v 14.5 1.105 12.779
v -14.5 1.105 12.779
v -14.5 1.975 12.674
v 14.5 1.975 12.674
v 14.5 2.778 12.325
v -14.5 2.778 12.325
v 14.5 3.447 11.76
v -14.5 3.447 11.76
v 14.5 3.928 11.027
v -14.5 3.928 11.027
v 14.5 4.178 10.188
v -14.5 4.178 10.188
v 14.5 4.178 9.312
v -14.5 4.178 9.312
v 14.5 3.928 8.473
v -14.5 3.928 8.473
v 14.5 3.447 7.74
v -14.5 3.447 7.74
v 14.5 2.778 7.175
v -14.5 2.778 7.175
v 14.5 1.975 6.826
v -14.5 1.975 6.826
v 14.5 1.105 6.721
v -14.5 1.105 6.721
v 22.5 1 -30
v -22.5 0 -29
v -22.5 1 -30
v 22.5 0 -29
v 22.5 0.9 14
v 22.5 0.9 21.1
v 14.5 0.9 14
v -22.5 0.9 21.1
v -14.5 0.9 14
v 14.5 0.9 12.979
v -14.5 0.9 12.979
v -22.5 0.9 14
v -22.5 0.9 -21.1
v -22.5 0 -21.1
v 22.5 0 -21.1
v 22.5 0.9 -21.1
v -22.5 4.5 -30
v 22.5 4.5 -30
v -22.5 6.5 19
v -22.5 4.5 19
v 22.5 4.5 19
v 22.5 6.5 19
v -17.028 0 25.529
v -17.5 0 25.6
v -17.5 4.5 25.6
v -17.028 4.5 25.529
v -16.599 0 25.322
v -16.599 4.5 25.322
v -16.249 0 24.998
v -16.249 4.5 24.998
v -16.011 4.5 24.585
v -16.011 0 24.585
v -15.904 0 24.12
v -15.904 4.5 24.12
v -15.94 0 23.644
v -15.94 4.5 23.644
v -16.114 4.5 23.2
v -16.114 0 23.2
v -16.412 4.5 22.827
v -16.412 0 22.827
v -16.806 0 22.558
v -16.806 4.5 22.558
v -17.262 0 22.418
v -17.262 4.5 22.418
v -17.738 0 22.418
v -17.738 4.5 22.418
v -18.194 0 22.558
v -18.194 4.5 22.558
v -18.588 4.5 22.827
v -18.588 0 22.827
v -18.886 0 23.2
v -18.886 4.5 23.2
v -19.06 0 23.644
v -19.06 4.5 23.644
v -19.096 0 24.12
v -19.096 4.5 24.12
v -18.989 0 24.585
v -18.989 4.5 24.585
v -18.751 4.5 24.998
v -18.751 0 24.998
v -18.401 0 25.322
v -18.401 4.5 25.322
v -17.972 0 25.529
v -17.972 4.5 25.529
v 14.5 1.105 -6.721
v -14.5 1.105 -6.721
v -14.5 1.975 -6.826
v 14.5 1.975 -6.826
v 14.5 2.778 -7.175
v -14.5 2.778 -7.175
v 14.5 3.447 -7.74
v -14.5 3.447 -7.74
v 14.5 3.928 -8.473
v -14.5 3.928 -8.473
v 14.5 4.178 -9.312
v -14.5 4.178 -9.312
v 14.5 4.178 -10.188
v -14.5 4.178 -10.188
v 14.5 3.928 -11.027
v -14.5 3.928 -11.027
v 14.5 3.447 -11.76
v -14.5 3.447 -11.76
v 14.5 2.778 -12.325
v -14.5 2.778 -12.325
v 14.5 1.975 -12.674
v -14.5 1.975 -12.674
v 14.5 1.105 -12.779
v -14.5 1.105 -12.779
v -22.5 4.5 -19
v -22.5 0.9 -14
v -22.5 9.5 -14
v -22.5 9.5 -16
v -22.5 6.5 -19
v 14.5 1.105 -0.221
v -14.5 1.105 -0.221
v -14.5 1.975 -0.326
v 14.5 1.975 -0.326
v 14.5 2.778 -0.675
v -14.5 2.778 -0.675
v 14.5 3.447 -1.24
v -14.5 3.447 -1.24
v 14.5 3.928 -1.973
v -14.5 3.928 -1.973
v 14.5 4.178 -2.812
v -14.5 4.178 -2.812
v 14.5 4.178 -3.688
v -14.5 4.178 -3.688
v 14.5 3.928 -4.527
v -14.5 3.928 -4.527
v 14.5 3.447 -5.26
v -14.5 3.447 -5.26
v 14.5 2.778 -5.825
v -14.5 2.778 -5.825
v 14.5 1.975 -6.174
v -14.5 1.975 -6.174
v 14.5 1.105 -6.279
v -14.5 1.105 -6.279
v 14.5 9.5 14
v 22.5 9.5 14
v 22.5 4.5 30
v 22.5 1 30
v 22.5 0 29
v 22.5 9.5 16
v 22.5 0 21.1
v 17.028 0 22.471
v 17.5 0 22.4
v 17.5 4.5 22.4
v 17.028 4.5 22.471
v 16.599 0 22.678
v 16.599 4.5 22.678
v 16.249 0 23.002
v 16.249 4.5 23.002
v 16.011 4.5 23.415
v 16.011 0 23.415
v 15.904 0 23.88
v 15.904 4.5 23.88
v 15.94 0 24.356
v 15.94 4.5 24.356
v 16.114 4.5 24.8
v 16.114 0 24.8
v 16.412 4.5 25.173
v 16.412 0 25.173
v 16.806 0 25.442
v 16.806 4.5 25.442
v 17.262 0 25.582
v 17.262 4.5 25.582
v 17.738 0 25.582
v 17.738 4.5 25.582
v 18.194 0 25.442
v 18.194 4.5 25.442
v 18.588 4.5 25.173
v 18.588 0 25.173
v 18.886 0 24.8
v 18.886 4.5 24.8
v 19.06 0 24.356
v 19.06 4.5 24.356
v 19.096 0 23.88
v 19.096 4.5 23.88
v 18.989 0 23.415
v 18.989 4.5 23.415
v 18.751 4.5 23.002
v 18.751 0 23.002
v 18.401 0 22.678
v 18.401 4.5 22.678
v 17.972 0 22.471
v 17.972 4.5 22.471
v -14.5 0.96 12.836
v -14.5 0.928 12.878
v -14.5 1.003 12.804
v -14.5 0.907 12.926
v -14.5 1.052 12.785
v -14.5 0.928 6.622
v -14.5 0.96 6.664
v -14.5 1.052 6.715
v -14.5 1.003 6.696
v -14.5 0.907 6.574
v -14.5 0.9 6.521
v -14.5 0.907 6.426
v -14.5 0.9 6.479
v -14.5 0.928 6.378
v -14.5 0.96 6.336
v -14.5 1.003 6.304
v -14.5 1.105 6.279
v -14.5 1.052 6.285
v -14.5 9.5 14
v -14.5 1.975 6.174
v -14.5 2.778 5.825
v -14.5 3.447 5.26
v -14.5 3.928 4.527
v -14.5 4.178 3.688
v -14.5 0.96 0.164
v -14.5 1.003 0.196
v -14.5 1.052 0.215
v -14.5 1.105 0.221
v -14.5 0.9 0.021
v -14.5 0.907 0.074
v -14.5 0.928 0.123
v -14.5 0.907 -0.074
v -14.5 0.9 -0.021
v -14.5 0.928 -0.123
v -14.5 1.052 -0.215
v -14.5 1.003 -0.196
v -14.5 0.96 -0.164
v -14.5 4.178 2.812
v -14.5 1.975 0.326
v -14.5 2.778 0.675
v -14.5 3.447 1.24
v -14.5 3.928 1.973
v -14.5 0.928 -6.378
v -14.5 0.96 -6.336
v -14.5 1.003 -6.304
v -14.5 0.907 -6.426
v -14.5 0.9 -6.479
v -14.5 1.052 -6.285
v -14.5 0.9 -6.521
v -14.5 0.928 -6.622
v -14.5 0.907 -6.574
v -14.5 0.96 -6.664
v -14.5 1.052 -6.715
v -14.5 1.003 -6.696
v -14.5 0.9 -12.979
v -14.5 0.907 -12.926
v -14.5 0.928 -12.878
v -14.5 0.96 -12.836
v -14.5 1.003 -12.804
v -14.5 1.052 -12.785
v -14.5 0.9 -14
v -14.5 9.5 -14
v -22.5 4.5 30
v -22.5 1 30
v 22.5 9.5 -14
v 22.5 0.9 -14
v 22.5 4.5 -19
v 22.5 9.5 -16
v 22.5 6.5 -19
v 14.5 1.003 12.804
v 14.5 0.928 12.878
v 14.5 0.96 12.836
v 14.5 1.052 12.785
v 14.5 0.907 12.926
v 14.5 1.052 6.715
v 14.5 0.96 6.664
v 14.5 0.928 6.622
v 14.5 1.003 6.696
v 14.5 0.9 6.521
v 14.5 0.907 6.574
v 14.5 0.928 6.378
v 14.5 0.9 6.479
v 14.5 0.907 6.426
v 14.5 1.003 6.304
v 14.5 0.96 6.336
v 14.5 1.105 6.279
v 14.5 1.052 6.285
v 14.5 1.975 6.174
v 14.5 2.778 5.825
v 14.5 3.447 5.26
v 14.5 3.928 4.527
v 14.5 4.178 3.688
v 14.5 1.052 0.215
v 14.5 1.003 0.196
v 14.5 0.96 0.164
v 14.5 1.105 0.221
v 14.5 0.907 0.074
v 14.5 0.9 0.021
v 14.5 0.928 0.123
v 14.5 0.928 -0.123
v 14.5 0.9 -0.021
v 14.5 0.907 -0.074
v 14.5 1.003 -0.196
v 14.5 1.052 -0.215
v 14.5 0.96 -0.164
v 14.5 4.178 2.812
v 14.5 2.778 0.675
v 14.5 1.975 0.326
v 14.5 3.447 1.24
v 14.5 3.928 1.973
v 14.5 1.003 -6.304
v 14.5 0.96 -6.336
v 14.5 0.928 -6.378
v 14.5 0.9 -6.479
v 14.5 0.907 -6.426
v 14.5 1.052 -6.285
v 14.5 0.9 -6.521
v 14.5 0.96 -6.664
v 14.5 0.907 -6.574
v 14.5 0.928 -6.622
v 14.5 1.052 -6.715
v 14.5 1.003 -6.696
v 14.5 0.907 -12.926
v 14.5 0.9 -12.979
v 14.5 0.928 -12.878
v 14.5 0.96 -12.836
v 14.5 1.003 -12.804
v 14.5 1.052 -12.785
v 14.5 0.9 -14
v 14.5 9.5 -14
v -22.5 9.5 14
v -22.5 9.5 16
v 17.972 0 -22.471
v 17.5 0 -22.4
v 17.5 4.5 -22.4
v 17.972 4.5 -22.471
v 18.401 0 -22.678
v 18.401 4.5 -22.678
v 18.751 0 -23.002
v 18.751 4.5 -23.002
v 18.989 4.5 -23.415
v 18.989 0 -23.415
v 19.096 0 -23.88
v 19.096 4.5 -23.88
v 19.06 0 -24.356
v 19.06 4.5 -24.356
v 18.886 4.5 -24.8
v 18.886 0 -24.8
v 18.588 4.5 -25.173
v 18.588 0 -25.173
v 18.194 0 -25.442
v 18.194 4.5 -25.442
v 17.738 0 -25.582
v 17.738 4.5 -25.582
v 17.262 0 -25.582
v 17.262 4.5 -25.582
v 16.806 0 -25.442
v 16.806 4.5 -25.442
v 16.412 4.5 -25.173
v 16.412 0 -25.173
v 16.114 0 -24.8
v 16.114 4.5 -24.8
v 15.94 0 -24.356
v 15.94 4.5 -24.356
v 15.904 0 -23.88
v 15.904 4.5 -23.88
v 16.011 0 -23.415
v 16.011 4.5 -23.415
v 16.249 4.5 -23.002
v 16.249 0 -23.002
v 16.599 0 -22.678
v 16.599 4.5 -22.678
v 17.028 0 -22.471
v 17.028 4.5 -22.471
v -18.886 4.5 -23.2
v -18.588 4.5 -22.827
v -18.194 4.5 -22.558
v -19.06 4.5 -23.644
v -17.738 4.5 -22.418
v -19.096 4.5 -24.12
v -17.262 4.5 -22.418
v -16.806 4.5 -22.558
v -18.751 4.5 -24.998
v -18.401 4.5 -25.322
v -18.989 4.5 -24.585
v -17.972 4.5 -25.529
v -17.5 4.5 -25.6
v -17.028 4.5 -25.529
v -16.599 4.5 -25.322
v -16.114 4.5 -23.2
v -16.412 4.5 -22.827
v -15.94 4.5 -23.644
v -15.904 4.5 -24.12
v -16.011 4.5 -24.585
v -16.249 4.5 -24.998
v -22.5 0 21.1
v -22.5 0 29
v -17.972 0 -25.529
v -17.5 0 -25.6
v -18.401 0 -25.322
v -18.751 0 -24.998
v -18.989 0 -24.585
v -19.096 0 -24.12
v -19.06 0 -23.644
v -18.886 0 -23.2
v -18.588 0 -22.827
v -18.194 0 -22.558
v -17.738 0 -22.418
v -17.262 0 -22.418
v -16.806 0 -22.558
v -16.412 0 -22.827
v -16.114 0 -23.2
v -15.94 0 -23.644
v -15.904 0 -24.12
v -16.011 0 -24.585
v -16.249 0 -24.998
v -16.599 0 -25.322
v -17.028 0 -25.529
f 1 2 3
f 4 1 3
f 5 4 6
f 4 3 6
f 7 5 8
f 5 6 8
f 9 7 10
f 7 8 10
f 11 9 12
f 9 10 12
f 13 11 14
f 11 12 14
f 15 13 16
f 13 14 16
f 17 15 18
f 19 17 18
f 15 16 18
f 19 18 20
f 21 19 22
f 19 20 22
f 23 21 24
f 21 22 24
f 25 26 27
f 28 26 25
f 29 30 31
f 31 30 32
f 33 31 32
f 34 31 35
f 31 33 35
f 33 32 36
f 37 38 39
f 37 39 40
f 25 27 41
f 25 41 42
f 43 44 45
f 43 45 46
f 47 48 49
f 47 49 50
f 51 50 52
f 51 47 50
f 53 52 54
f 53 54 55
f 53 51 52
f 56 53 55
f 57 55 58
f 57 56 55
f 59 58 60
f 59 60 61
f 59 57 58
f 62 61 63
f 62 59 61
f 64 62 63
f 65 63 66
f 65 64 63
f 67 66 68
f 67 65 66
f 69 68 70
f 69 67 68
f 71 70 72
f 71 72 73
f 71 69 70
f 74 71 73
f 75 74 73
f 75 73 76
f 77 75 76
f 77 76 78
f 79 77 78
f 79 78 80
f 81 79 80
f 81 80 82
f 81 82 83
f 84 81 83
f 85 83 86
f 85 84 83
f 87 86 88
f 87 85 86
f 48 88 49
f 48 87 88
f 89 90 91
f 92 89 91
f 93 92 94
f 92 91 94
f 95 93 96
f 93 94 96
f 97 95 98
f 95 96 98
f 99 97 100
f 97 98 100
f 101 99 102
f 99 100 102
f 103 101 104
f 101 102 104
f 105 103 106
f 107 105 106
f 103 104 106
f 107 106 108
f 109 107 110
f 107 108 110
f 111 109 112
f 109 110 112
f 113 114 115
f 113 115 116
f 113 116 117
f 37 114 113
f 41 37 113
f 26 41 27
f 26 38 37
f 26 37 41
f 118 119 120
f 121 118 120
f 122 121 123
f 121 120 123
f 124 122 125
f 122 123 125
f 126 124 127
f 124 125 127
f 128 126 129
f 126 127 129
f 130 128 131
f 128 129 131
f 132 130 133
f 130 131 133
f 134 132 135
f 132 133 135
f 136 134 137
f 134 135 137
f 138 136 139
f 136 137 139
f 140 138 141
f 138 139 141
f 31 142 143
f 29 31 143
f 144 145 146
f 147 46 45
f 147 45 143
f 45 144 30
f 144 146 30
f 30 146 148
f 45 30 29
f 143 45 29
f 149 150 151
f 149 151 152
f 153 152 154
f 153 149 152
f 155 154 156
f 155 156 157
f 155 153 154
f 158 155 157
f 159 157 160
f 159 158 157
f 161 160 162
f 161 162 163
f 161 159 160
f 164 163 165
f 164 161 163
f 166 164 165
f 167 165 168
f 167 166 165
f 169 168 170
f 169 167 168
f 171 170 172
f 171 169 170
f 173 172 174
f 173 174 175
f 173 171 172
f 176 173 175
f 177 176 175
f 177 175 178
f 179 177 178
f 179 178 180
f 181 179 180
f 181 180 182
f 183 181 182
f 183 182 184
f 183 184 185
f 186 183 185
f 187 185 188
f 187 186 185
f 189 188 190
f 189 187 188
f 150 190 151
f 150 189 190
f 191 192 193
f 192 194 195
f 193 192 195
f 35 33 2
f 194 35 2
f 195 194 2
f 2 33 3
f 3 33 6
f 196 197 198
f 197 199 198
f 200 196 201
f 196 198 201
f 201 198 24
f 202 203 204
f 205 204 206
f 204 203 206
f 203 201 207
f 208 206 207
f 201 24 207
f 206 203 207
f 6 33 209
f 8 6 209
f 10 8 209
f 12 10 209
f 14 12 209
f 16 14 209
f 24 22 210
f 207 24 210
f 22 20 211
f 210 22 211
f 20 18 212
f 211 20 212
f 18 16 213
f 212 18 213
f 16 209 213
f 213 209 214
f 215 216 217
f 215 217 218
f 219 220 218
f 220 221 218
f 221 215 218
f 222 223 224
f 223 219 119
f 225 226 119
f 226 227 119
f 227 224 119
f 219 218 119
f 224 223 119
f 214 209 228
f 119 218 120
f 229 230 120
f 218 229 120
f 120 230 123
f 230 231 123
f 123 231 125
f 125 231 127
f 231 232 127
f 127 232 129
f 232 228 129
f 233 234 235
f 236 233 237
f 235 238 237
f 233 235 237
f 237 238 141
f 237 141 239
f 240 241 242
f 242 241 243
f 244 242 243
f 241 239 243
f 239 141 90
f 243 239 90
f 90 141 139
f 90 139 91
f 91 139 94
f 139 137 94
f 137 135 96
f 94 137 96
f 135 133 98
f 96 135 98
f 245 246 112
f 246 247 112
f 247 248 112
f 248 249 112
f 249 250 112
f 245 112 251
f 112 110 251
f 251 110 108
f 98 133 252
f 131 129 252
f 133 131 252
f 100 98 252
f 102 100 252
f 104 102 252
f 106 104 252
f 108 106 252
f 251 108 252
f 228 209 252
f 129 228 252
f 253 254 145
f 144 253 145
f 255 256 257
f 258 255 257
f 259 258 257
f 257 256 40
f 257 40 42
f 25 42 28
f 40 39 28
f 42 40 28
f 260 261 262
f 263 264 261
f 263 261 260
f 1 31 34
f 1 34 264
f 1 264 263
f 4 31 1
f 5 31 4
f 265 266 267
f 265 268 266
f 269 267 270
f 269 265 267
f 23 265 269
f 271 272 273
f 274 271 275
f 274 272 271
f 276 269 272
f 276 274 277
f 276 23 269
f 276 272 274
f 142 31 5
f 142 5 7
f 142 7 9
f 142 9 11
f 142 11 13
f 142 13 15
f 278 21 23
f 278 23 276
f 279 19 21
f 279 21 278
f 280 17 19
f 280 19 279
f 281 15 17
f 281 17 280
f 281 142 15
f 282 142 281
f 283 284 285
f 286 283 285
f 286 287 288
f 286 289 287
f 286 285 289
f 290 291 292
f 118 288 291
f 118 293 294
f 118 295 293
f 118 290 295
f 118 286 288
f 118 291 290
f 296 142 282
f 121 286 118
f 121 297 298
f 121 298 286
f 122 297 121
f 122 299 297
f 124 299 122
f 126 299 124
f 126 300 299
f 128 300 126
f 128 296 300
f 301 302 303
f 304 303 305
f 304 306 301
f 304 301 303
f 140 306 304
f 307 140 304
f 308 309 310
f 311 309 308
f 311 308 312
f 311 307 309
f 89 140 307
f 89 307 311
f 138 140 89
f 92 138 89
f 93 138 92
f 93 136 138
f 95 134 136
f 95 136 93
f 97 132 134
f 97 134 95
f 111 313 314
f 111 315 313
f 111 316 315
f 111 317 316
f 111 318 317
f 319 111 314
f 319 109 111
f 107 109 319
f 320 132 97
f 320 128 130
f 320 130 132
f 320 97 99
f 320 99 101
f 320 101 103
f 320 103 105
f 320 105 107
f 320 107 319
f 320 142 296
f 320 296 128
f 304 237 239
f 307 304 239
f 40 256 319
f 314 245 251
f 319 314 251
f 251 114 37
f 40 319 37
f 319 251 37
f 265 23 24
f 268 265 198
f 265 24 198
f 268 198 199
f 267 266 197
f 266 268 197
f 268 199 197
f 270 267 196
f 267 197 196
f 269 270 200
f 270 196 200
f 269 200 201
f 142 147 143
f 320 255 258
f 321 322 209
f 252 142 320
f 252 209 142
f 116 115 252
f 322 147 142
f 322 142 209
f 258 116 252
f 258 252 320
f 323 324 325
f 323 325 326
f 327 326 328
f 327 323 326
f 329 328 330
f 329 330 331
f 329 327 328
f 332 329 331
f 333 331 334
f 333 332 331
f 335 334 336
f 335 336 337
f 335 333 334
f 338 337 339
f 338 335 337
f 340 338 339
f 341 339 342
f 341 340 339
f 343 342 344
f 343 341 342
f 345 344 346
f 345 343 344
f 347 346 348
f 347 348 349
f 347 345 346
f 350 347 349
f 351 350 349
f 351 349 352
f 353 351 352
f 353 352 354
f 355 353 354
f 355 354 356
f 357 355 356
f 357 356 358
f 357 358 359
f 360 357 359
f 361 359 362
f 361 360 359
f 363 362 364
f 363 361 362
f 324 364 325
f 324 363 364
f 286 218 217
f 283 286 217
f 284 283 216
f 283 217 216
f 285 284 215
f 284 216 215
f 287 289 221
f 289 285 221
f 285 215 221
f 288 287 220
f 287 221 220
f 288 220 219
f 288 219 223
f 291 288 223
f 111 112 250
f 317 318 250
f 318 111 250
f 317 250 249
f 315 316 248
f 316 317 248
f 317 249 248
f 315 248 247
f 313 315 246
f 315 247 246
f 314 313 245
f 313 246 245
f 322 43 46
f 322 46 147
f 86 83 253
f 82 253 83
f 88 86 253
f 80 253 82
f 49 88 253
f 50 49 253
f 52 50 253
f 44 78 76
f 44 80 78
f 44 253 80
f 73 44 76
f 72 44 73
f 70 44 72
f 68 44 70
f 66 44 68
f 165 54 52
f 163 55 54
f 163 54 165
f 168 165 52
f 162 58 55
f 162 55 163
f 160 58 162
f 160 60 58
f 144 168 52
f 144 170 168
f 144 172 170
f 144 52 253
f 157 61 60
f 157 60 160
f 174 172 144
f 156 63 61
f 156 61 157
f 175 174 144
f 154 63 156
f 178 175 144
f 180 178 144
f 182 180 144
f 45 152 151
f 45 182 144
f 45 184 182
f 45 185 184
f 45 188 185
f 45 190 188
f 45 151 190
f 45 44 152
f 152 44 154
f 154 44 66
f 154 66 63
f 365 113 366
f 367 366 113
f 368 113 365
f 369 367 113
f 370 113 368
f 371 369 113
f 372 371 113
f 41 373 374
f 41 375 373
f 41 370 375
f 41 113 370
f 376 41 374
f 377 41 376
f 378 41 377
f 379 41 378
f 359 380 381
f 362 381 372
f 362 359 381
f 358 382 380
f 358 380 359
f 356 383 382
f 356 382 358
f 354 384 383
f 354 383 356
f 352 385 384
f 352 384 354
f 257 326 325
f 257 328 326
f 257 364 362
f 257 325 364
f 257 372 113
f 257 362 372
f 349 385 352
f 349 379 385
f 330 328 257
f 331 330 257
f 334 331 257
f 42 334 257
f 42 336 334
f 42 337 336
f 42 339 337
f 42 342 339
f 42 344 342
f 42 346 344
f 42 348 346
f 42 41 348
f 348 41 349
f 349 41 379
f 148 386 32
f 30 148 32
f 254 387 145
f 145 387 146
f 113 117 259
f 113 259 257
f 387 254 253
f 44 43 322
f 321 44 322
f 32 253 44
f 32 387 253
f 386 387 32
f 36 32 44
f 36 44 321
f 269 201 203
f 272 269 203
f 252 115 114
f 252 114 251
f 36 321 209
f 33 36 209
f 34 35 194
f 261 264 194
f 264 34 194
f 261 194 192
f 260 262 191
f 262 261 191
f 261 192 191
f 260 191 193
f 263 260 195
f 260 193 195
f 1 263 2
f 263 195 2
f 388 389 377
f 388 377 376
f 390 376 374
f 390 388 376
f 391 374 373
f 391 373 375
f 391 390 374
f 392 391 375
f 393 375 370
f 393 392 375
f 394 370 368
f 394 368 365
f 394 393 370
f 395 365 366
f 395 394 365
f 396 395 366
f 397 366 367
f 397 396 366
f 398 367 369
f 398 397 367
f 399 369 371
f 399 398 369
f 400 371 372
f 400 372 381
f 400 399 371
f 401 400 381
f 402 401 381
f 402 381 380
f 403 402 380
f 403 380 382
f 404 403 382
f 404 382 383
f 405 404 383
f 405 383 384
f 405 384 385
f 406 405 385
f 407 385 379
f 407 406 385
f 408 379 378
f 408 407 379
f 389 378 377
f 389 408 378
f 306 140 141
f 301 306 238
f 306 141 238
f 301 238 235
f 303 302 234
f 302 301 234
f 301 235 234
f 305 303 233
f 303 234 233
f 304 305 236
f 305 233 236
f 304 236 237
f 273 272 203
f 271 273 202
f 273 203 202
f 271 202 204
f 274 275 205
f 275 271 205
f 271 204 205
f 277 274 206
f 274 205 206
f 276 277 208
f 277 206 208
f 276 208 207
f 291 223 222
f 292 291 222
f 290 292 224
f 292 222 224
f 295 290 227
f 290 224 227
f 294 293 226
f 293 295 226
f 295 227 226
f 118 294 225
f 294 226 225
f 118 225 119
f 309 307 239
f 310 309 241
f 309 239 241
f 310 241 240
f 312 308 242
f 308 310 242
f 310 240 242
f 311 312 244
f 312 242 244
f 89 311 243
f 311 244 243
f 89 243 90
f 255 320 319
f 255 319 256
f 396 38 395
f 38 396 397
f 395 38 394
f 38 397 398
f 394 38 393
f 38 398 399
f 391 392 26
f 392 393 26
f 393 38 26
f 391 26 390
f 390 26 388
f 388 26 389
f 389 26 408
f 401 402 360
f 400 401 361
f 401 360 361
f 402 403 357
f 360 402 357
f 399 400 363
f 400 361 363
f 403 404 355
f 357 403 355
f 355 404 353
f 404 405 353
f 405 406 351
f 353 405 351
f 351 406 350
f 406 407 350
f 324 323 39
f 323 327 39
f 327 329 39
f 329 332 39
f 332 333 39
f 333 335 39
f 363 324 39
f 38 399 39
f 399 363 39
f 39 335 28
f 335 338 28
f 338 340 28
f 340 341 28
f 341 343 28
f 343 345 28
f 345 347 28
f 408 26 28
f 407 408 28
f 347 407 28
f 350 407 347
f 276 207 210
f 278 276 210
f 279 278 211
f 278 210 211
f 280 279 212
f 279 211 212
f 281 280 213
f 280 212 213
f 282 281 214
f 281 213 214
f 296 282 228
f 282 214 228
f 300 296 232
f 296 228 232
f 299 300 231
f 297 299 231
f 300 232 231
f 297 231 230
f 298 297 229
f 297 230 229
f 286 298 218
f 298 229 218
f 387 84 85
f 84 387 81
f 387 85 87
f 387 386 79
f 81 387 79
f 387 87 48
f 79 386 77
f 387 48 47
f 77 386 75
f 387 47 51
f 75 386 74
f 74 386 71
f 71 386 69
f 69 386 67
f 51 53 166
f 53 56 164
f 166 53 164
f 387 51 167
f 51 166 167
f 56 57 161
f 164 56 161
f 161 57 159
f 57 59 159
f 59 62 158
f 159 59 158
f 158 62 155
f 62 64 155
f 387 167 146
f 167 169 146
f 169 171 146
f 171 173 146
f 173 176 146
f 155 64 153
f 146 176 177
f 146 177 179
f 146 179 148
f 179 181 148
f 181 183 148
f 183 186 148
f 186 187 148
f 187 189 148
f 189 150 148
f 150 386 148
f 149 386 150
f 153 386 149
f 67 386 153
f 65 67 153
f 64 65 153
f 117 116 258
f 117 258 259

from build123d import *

# Parameters (mm, degrees)
SKETCH1_W                = 45
SKETCH1_H                = 60
SKETCH1_R                = 1.6
BOSS_EXTRUDE1_DEPTH      = 4.5
CHAMFER1_SIZE            = 1
CUT_EXTRUDE1_DEPTH       = 38.769034936
CUT_EXTRUDE1_DEPTH_BACK  = 38.769034936
SKETCH2_W                = 42.2
SKETCH2_H                = 1.8
BOSS_EXTRUDE2_DEPTH      = 22.5
BOSS_EXTRUDE2_DEPTH_BACK = 22.5
CUT_EXTRUDE2_DEPTH       = 39.684622268
CUT_EXTRUDE2_DEPTH_BACK  = 39.684622268
SKETCH6_W                = 16.662256764
SKETCH6_H                = 27.999999992
SKETCH6_W_2              = 12.602721676
CUT_EXTRUDE3_DEPTH       = 10


with BuildPart() as part:
    # Sketch1 → Boss-Extrude1 (new body)
    with BuildSketch(Plane(origin=(0, 0, 0), x_dir=(1, 0, 0), z_dir=(0, 1, 0))):
        Rectangle(SKETCH1_W, SKETCH1_H)
        with Locations(Location((17.5, 24, 0), (0, 0, 270))):
            Circle(SKETCH1_R, mode=Mode.SUBTRACT)
        with Locations(Location((-17.5, 24, 0), (0, 0, 90))):
            Circle(SKETCH1_R, mode=Mode.SUBTRACT)
        with Locations(Location((-17.5, -24, 0), (0, 0, 270))):
            Circle(SKETCH1_R, mode=Mode.SUBTRACT)
        with Locations(Location((17.5, -24, 0), (0, 0, 90))):
            Circle(SKETCH1_R, mode=Mode.SUBTRACT)
    extrude(amount=BOSS_EXTRUDE1_DEPTH)

    # Chamfer1
    chamfer1_edges = [part.edges().sort_by_distance(p)[0] for p in [
        (0, 0, 30),
        (0, 0, -30),
    ]]
    chamfer(chamfer1_edges, length=CHAMFER1_SIZE)

    # Sketch2 → Cut-Extrude1 (cut, two sides: drawn at the far end of the back side and taken through both)
    with BuildSketch(Plane(origin=(0, 0, 0), x_dir=(0, 0, -1), z_dir=(1, 0, 0)).offset(-CUT_EXTRUDE1_DEPTH_BACK)):
        Rectangle(SKETCH2_W, SKETCH2_H)
    extrude(amount=CUT_EXTRUDE1_DEPTH + CUT_EXTRUDE1_DEPTH_BACK, mode=Mode.SUBTRACT)

    # Sketch4 → Boss-Extrude2 (add, two sides: drawn at the far end of the back side and taken through both)
    with BuildSketch(Plane(origin=(0, 0, 0), x_dir=(0, 0, -1), z_dir=(1, 0, 0)).offset(-BOSS_EXTRUDE2_DEPTH_BACK)):
        Polygon((19, 4.5), (-19, 4.5), (-19, 6.5), (-16, 9.5), (16, 9.5), (19, 6.5), align=None)
    extrude(amount=BOSS_EXTRUDE2_DEPTH + BOSS_EXTRUDE2_DEPTH_BACK)

    # Sketch5 → Cut-Extrude2 (cut, two sides: drawn at the far end of the back side and taken through both)
    with BuildSketch(Plane(origin=(0, 0, 0), x_dir=(0, 0, -1), z_dir=(1, 0, 0)).offset(-CUT_EXTRUDE2_DEPTH_BACK)):
        with BuildLine():
            Line((-0.021267592, 0.9), (0.021267592, 0.9))
            ThreePointArc((0.021267592, 0.9), (0.164249511, 0.960439924), (0.22092951, 1.10495356))
            ThreePointArc((0.22092951, 1.10495356), (3.25, 4.21), (6.27907049, 1.10495356))
            ThreePointArc((6.27907049, 1.10495356), (6.335847144, 0.960340972), (6.479009136, 0.9))
            Line((6.479009136, 0.9), (6.520990864, 0.9))
            ThreePointArc((6.520990864, 0.9), (6.664152856, 0.960340972), (6.72092951, 1.10495356))
            ThreePointArc((6.72092951, 1.10495356), (9.75, 4.21), (12.77907049, 1.10495356))
            ThreePointArc((12.77907049, 1.10495356), (12.835847144, 0.960340972), (12.979009136, 0.9))
            Line((12.979009136, 0.9), (11.734788972, -2.913913916))
            Line((11.734788972, -2.913913916), (-11.720609732, -4.129919609))
            Line((-11.720609732, -4.129919609), (-12.979009136, 0.9))
            ThreePointArc((-12.979009136, 0.9), (-12.835847144, 0.960340972), (-12.77907049, 1.10495356))
            ThreePointArc((-12.77907049, 1.10495356), (-9.75, 4.21), (-6.72092951, 1.10495356))
            ThreePointArc((-6.72092951, 1.10495356), (-6.664152856, 0.960340972), (-6.520990864, 0.9))
            Line((-6.520990864, 0.9), (-6.479009136, 0.9))
            ThreePointArc((-6.479009136, 0.9), (-6.335847144, 0.960340972), (-6.27907049, 1.10495356))
            ThreePointArc((-6.27907049, 1.10495356), (-3.25, 4.21), (-0.22092951, 1.10495356))
            ThreePointArc((-0.22092951, 1.10495356), (-0.164249511, 0.960439924), (-0.021267592, 0.9))
        make_face()
    extrude(amount=CUT_EXTRUDE2_DEPTH + CUT_EXTRUDE2_DEPTH_BACK, mode=Mode.SUBTRACT)

    # Sketch6 → Cut-Extrude3 (cut)
    with BuildSketch(Plane(origin=(0, 9.5, 0), x_dir=(1, 0, 0), z_dir=(0, 1, 0))):
        with Locations((-22.831128379, 0)):
            Rectangle(SKETCH6_W, SKETCH6_H)
        with Locations((20.801360835, 0)):
            Rectangle(SKETCH6_W_2, SKETCH6_H)
    extrude(amount=-CUT_EXTRUDE3_DEPTH, mode=Mode.SUBTRACT)


solid = part.part
